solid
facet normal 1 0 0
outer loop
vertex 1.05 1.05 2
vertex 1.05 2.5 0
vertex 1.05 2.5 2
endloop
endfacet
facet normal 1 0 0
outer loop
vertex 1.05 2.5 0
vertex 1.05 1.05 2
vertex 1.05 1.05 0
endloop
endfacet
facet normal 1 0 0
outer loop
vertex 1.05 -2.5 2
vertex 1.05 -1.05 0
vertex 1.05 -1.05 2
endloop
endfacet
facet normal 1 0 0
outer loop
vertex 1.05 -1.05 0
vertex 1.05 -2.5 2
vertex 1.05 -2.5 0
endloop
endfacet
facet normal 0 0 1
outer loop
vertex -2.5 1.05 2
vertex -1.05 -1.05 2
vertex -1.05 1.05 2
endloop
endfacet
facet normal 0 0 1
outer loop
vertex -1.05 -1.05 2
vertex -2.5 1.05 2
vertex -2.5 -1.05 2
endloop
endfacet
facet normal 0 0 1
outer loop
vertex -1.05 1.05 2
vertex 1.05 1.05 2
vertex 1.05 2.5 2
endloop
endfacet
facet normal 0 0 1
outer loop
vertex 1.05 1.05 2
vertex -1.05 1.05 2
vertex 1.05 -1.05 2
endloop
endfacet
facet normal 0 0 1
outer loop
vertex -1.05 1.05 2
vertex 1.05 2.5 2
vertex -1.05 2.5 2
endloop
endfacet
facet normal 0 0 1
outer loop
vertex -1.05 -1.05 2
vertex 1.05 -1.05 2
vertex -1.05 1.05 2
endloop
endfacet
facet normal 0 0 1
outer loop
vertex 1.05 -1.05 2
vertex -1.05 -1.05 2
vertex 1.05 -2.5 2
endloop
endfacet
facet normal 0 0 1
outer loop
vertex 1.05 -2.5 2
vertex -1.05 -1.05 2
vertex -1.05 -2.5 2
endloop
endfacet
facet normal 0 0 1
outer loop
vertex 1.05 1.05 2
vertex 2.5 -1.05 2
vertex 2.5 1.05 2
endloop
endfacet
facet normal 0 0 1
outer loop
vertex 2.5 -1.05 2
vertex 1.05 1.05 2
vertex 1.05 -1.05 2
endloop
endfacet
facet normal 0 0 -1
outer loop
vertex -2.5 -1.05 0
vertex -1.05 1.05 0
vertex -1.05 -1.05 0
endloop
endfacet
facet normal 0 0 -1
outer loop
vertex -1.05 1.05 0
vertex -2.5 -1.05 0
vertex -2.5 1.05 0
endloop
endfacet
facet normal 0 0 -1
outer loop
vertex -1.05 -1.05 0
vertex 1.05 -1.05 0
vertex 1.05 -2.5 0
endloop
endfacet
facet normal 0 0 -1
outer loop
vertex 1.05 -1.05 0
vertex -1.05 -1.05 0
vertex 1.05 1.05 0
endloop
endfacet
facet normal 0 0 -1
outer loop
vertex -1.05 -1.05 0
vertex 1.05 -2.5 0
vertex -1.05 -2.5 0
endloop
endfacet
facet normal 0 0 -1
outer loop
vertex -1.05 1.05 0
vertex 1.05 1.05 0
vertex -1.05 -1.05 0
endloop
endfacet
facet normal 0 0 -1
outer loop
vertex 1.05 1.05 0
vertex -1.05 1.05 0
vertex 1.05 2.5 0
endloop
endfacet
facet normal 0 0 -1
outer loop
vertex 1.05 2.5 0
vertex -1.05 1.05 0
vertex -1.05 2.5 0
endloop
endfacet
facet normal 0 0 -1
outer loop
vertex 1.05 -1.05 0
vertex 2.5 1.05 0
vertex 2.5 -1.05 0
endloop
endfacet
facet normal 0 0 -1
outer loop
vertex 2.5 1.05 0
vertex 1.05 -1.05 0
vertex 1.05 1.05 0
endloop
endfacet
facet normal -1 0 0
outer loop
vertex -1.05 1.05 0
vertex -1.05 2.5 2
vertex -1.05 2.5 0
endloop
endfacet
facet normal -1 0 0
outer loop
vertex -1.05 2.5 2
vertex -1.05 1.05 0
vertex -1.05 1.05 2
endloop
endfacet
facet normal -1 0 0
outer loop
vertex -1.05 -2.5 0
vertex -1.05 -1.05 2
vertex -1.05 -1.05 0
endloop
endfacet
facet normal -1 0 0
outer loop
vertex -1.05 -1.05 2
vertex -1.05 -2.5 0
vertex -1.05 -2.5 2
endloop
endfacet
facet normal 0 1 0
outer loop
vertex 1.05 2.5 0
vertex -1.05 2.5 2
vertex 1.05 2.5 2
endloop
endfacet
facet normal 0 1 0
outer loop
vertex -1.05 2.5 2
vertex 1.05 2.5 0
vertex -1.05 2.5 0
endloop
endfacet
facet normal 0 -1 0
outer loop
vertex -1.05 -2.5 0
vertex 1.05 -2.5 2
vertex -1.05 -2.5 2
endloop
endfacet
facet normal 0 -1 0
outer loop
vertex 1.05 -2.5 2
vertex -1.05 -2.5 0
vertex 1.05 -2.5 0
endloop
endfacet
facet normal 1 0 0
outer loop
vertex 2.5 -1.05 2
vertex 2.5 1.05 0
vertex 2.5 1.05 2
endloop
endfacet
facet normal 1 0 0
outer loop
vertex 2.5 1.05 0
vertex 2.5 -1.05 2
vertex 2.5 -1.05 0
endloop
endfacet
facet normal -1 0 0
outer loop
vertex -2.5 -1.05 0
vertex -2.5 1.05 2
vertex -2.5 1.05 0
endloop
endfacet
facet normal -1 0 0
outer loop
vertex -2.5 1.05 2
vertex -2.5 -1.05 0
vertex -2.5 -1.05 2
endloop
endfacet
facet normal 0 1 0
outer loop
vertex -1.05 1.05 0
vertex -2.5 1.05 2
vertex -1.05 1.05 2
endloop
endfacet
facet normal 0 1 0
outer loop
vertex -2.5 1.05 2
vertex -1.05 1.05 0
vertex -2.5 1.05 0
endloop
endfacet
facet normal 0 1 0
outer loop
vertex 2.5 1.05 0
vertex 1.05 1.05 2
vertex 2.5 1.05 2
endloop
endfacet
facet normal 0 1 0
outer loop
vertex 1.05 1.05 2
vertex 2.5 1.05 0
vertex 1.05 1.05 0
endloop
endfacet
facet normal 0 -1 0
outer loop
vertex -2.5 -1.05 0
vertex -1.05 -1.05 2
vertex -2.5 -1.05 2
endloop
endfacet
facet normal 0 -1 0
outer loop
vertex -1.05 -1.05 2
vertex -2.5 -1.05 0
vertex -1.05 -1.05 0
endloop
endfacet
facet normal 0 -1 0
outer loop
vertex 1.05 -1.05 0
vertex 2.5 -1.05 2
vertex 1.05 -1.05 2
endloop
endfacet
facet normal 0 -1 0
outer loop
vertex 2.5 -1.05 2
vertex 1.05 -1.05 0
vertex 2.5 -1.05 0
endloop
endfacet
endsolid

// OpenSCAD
// file: lib.scad
// modules not related to bricks

// --  rounded cylinder ---------------------------------------------------------------------------------------

// produces a cylinder in 3 sections
// d: base diameter
// h: total height
// rt: top section height
// rtw: top section diameter difference
// rb: bottom section height
// rbw: bottom section diameter difference
module rounded_cylinder(d,h,rt,rtw,rb,rbw,fn=36){
    cylinder(d2=d,d1=d-rbw,h=rb,$fn=fn);
    translate([0,0,rb])
    cylinder(d=d,h=h-rb-rt,$fn=fn);
    translate([0,0,h-rt])
    cylinder(d1=d,d2=d-rtw,h=rt,$fn=fn);    
}


// -- roundedcube ----------------------------------------------------------------------------------------------



// rounded cube --
// original idea:
// https://stackoverflow.com/questions/33146741/way-to-round-edges-of-objects-openscad


module __neg_round_edge(height,radius,fn=36){
  difference(){
    translate([-.5,-.5,0])
      cube([radius+.5,radius+.5,height]);
      translate([radius,radius,height/2+1]) cylinder(height+3,radius,radius,true,$fn=fn);
   }
}


module __neg_round_edges(xx,yy,zz,radius,cf=[1,1,1,1]){
  if (cf[0]>0) 
    __neg_round_edge(zz,cf[0]*radius);  
  if (cf[1]>0) 
    translate([xx,0,0]) rotate([0,0,90]) __neg_round_edge(zz,cf[1]*radius);  
  if (cf[2]>0) 
     translate([xx,yy,0]) rotate([0,0,180]) __neg_round_edge(zz,cf[2]*radius);  
  if (cf[3]>0) 
     translate([0,yy,0]) rotate([0,0,270]) __neg_round_edge(zz,cf[3]*radius);      
}

module __neg_rounded_cube(xx, yy, zz, radius,top=true,bottom=true,x=[1,1,1,1],y=[1,1,1,1],z=[1,1,1,1]) {
     __neg_round_edges(xx,yy,zz,radius,x);
    translate([0,yy,0]) rotate([90,0,0]) __neg_round_edges(xx,zz,yy,radius,y);
    translate([0,0,zz]) rotate([0,90,0]) __neg_round_edges(zz,yy,xx,radius,x);
}



// produces a cube with round corners
// xx:width
// yy:length
// zz:depth
// radius: radius of the corners
// z,y,z: allow to turn off rounding for some specific corners TODO remove
module rounded_cube(xx, yy, zz, radius,x=[1,1,1,1],y=[1,1,1,1],z=[1,1,1,1]) {
  difference(){
    cube([xx,yy,zz]);
    __neg_rounded_cube(xx,yy,zz,radius,x,y,z);
  }
}



// -- rounded_square_tube -----------------------------------------------------------------------------------

// produces a vertical square tube with rounded corners
// params:
// w:width
// l:length
// h:height
// t:thickness of wall
// r:radius of rounded corner
// fill: whether it is empty or not

module rounded_square_tube(w,l,h,t,r,fill=false){

  
  __roundedcorner(r,h,t,fill=fill);
    
  translate([w,0,0]) mirror([1,0,0]) __roundedcorner(r,h,t,fill=fill);
    
  translate([0,l,0]) mirror([0,1,0]) __roundedcorner(r,h,t,fill=fill);
  translate([w,l,0]) mirror([1,1,0]) __roundedcorner(r,h,t,fill=fill);
    
  if (fill){
    translate([r,0,0]) cube([w-r-r,l,h]);
    translate([0,r,0]) cube([w,l-r-r,h]);
  } else {
    translate([0,r,0]) cube([t,l-r-r,h]);
    translate([w-t,r,0]) cube([t,l-r-r,h]);
    translate([r,0,0]) cube([w-r-r,t,h]);
    translate([r,l-t,0]) cube([w-r-r,t,h]);
  }
}

// just a single rounded corner
// r: radiuse
// h:height
// t:thickness
// fill: if true t is ignored and the inner part of the curve is filled
module __roundedcorner(r,h,t,fill=false){

  intersection(){
    cube([r,r,h]);
    translate([r,r,0]){

    difference(){
        cylinder(d=r+r,h=h,$fn=24);
        if (!fill)
            translate([0,0,-1]) cylinder(d=r+r-t-t,h=h+2,$fn=24);
      }
    }
  }
}


// tests
translate([0,0,0]) rounded_cylinder(d=10,h=20,rt=10,rtw=5,rb=2,rbw=2);
translate([10,0,0]) rounded_cube(xx=5,yy=10,zz=20,radius=1);
translate([20,0,0])  rounded_square_tube(20,10,2,1,3,fill=false);
// main file
use <lib.scad>;

// modules used by other pieces

module bar_hole(l){
  t=1.8+0.3;
  d=4.7+0.3;   

  translate([-t/2,-d/2,0])
  union(){
  cube([t,d,l]);
  translate([+t/2-d/2,-t/2+d/2])
  cube([d,t,l]);
}
}


bar_hole(2);
